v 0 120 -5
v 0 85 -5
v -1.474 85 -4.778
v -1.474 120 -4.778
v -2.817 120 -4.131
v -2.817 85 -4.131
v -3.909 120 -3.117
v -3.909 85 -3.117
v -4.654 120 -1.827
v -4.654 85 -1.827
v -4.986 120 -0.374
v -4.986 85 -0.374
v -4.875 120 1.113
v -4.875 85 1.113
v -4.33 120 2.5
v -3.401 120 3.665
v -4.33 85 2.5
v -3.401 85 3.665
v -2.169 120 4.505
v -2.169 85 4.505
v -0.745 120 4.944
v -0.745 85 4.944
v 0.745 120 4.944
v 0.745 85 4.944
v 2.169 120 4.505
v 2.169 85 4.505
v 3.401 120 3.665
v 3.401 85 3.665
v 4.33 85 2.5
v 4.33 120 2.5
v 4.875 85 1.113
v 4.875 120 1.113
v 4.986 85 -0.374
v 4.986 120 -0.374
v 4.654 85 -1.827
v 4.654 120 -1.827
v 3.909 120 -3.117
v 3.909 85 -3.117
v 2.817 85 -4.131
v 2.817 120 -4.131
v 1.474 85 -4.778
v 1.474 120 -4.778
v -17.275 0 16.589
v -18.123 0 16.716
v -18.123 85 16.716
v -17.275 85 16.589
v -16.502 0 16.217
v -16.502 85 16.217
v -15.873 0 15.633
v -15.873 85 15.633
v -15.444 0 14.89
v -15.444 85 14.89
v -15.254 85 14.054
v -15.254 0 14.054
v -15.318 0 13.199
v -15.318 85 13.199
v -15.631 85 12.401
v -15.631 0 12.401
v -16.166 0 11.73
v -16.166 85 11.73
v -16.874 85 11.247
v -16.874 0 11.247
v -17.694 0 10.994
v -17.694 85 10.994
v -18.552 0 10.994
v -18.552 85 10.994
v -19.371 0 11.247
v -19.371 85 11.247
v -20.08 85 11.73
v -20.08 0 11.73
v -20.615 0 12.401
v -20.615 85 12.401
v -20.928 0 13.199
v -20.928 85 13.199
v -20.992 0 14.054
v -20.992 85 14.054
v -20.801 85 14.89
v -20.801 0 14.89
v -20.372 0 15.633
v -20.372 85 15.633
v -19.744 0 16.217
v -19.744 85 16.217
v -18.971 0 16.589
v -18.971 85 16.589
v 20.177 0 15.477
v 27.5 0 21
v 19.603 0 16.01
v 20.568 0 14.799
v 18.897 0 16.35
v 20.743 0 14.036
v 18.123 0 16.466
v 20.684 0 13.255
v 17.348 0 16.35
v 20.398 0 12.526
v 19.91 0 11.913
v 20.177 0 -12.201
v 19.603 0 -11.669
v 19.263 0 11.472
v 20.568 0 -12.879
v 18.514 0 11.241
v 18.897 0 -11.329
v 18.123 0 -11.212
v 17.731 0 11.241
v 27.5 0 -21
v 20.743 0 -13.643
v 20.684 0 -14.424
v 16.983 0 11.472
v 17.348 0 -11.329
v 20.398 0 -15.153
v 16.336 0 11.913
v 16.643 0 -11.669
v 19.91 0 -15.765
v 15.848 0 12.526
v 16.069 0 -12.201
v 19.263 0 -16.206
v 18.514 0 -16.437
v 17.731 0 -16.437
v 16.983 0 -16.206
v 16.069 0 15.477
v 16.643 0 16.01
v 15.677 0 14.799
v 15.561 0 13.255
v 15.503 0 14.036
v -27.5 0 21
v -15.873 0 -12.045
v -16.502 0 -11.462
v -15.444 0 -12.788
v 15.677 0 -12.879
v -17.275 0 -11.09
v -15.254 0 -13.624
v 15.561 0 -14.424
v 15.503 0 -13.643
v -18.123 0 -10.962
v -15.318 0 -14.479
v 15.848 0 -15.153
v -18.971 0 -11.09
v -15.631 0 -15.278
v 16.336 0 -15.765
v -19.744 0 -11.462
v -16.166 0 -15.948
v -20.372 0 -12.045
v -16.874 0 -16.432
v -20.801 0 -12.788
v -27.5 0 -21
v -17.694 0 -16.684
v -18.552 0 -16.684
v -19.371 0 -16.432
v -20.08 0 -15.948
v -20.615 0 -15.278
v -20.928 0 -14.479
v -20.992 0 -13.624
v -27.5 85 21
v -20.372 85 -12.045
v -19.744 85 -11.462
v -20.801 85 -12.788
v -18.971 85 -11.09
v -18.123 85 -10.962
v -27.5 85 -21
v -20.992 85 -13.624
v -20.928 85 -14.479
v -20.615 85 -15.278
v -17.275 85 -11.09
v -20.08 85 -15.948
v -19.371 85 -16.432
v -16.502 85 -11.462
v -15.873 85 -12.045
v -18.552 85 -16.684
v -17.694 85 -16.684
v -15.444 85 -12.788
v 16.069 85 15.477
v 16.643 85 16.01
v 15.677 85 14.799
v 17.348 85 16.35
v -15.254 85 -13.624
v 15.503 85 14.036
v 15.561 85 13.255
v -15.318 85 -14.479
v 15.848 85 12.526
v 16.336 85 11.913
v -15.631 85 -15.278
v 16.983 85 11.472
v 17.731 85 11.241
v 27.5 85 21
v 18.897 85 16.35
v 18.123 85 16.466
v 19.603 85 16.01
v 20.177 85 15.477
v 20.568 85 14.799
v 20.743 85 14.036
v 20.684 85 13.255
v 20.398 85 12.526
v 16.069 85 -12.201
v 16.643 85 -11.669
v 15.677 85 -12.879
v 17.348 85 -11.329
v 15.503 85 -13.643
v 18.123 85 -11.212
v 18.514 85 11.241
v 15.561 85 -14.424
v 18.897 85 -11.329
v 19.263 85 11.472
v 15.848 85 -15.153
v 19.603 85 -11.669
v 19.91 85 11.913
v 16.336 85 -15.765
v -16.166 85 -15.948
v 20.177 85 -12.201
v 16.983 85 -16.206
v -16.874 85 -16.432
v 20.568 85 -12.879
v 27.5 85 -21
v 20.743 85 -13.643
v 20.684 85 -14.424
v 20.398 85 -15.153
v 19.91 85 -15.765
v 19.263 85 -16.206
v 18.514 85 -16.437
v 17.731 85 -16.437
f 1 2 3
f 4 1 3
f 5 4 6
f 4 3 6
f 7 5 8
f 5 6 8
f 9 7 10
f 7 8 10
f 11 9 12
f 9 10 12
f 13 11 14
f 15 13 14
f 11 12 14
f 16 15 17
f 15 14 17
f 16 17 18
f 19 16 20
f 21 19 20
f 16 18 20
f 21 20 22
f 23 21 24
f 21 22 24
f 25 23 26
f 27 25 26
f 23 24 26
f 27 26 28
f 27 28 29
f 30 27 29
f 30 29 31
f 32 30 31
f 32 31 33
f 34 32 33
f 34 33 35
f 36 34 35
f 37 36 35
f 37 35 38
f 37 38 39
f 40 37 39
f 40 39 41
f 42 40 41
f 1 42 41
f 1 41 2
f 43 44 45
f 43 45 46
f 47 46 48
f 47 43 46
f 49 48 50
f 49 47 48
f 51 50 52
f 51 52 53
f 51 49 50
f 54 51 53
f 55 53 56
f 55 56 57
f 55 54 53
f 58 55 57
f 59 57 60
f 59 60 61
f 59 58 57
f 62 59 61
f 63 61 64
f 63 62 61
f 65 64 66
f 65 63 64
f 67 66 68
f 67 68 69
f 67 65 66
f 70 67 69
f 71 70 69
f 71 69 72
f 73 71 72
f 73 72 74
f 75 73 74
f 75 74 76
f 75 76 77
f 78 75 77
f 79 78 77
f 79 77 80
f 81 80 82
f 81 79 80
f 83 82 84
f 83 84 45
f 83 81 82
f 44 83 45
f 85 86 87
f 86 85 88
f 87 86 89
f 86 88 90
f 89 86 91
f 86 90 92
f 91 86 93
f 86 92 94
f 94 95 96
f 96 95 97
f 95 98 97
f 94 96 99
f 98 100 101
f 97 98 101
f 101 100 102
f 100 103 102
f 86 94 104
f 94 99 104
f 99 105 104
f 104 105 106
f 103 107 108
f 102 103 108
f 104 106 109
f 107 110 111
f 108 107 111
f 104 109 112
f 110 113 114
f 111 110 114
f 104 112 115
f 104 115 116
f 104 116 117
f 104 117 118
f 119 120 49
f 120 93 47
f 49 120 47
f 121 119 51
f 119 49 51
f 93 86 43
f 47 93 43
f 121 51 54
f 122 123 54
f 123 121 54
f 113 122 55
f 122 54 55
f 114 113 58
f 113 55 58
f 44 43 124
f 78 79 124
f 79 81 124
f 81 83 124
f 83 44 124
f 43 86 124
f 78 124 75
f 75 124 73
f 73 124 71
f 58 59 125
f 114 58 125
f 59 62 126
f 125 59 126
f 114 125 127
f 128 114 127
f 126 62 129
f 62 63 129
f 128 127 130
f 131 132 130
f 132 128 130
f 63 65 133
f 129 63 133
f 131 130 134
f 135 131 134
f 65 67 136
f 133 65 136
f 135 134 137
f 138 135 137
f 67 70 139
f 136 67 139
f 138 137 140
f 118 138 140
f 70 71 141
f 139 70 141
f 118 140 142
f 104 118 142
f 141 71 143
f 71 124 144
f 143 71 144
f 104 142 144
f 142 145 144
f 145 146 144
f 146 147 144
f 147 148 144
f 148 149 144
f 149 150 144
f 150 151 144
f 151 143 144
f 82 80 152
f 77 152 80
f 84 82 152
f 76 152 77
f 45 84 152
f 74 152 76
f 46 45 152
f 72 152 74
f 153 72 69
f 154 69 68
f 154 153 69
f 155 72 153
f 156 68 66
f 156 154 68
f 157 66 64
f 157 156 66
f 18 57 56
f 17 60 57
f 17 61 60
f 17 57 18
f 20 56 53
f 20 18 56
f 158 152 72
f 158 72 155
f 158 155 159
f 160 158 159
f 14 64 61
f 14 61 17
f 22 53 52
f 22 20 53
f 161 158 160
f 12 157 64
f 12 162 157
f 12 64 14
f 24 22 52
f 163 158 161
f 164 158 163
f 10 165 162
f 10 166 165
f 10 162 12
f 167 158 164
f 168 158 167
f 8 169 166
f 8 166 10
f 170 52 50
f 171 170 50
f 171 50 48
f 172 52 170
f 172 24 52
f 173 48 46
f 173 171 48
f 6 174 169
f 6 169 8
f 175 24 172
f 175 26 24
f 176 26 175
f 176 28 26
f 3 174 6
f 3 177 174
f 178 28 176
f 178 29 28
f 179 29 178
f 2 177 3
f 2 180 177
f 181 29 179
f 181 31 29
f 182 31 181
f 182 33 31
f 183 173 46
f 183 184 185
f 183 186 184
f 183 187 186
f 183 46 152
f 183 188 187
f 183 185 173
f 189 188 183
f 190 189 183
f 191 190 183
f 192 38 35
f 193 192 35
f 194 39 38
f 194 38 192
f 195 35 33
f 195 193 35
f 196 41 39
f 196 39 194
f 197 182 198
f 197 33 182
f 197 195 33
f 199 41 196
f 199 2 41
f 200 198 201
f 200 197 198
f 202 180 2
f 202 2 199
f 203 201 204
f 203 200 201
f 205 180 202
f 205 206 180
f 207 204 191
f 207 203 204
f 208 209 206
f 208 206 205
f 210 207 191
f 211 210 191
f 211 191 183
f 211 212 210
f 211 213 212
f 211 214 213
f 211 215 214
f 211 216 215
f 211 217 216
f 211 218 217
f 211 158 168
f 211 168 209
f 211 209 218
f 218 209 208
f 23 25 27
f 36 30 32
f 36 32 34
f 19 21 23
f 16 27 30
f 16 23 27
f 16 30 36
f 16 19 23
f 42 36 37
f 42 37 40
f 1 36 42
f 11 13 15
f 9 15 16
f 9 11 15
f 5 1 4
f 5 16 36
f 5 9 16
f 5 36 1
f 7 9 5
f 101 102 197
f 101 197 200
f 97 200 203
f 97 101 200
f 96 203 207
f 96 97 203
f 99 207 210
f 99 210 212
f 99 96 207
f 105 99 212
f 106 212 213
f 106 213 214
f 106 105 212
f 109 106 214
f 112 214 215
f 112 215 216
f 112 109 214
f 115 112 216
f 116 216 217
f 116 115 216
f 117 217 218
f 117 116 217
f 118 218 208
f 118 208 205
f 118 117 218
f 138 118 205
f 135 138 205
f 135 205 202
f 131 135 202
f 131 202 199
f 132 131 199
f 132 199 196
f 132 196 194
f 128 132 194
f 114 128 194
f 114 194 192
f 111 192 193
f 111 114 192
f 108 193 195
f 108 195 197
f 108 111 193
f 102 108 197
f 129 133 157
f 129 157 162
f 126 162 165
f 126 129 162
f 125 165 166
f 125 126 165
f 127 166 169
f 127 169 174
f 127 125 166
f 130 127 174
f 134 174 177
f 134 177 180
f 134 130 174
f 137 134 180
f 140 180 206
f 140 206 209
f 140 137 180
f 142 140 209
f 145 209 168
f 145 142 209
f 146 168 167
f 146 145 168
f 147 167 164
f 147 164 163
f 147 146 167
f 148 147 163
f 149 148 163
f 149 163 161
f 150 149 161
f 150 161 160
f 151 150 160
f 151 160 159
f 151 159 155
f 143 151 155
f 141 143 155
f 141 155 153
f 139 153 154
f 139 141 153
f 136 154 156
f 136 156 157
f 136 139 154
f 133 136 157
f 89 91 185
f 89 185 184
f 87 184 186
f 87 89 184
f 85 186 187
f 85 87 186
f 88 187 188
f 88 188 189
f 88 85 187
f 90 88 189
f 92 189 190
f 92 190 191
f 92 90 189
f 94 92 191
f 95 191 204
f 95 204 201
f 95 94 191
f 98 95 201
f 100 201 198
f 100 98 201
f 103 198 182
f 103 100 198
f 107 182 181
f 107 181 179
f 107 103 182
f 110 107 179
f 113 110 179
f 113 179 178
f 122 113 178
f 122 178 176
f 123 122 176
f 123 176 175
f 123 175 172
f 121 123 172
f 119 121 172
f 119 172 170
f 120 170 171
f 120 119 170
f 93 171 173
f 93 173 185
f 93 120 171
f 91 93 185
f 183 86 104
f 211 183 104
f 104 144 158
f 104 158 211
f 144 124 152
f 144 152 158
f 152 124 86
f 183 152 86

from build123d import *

# Parameters (mm, degrees)
F_01_HOUSING_PROFILE_W      = 55
F_01_HOUSING_PROFILE_H      = 42
F_01_HOUSING_PROFILE_R      = 2.877277304
F_01_HOUSING_PROFILE_R_2    = 2.627218626
F_01_HOUSING_BLOCK_DEPTH    = 85
F_03_OUTPUT_SHAFT_PROFILE_R = 5
F_03_OUTPUT_SHAFT_DEPTH     = 120


with BuildPart() as part:
    # 01_Housing_Profile → 01_Housing_Block (new body)
    with BuildSketch(Plane(origin=(0, 0, 0), x_dir=(1, 0, 0), z_dir=(0, 1, 0))):
        Rectangle(F_01_HOUSING_PROFILE_W, F_01_HOUSING_PROFILE_H)
        with Locations(Location((-18.122781374, -13.839214867, 0), (0, 0, 270))):
            Circle(F_01_HOUSING_PROFILE_R, mode=Mode.SUBTRACT)
        with Locations(Location((18.122781374, -13.839214867, 0), (0, 0, 270))):
            Circle(F_01_HOUSING_PROFILE_R_2, mode=Mode.SUBTRACT)
        with Locations(Location((-18.122781374, 13.839214867, 0), (0, 0, 270))):
            Circle(F_01_HOUSING_PROFILE_R, mode=Mode.SUBTRACT)
        with Locations(Location((18.122781374, 13.839214867, 0), (0, 0, 270))):
            Circle(F_01_HOUSING_PROFILE_R_2, mode=Mode.SUBTRACT)
    extrude(amount=F_01_HOUSING_BLOCK_DEPTH)

    # 03_Output_Shaft_Profile → 03_Output_Shaft (add)
    with BuildSketch(Plane(origin=(0, 0, 0), x_dir=(1, 0, 0), z_dir=(0, 1, 0))):
        with Locations(Location((0, 0, 0), (0, 0, 90))):
            Circle(F_03_OUTPUT_SHAFT_PROFILE_R)
    extrude(amount=F_03_OUTPUT_SHAFT_DEPTH)


solid = part.part
